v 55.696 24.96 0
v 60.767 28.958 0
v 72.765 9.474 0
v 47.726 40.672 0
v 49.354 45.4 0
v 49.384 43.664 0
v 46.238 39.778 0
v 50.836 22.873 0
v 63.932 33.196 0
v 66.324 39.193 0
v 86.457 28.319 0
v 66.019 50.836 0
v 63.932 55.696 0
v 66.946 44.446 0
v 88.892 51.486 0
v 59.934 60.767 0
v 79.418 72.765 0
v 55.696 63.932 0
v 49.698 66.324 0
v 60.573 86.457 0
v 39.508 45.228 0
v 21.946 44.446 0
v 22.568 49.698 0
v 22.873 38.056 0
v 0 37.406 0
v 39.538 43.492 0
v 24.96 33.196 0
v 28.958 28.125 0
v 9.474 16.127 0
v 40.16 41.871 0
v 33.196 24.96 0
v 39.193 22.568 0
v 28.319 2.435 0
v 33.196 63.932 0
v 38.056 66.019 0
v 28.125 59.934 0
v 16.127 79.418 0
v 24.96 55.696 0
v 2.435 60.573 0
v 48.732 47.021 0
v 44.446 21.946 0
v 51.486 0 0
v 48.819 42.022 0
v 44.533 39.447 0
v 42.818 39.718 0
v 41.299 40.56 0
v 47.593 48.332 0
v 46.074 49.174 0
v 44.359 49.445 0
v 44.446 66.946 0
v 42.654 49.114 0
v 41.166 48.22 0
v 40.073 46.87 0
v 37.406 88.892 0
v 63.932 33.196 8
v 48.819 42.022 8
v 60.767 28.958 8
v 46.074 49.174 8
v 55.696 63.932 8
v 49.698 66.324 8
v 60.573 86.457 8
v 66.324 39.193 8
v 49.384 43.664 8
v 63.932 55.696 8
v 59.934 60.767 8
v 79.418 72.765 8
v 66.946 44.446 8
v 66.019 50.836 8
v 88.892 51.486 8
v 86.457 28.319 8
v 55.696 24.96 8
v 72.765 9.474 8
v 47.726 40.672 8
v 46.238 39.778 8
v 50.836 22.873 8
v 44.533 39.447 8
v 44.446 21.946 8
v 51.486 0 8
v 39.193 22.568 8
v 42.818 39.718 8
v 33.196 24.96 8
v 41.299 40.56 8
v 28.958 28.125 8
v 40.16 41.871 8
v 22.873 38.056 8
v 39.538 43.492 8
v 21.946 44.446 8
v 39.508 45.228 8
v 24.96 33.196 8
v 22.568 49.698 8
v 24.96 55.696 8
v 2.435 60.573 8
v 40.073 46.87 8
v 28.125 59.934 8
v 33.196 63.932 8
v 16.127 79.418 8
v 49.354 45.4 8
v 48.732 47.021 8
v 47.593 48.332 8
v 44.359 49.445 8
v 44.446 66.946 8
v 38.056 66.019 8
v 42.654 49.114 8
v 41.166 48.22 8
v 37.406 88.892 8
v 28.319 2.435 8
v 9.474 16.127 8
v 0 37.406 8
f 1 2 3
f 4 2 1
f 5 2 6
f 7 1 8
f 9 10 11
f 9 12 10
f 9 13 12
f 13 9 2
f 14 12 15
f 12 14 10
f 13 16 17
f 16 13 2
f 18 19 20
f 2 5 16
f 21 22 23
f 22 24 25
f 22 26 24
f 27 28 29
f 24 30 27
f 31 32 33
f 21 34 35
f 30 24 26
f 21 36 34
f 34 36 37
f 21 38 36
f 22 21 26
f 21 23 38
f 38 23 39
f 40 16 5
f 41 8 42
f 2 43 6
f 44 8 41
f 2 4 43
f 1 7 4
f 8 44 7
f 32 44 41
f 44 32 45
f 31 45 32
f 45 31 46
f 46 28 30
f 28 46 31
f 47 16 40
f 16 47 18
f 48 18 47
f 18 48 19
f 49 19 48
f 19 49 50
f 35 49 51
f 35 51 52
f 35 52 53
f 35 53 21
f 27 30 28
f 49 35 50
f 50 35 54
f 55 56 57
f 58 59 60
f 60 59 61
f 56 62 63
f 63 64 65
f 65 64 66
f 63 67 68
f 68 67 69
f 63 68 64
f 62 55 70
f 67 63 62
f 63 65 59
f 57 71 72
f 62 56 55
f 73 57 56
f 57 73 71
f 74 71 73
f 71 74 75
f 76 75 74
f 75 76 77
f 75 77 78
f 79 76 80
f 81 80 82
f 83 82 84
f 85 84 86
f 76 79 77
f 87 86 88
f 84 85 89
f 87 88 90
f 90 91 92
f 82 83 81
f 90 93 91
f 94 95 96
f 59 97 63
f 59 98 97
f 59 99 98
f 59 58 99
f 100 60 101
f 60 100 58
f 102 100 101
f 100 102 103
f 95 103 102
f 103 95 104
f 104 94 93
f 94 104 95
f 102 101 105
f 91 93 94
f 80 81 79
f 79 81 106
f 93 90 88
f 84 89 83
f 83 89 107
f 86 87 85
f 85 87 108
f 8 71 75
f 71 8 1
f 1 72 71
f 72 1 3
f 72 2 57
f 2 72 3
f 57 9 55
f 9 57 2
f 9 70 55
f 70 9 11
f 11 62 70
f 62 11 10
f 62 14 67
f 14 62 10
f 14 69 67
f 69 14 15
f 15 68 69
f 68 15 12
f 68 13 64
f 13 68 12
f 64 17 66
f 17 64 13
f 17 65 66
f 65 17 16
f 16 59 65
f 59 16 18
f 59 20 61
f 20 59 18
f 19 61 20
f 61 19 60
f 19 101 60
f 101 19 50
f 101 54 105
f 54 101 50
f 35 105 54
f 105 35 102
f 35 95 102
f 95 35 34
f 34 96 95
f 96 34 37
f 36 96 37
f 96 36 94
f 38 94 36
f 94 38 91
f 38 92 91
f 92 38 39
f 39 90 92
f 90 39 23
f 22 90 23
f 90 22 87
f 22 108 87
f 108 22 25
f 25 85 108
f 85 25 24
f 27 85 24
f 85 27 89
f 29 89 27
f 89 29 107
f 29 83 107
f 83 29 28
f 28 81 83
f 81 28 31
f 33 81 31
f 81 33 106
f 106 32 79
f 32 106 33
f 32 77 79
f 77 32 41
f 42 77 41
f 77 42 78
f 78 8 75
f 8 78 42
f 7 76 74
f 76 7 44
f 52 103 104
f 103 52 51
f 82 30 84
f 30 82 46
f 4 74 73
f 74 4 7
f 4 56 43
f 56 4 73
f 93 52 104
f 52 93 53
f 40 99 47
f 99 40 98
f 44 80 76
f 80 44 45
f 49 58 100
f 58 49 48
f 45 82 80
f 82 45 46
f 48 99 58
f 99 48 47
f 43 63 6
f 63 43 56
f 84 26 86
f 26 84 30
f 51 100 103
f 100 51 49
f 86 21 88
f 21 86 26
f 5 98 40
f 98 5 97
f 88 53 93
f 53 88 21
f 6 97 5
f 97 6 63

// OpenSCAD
$fn = 32;

// ----------------------------------------------------------------------
// Star wheel: 12-point ratchet, R45
// ----------------------------------------------------------------------

// --- parameters (mm) ---
n_points = 12;            // number of points / teeth
r_out = 45;               // tip radius
r_in = 22.5;              // root radius
bore_r = 5;               // centre bore radius
plate_t = 8;              // plate thickness, Z (extrusion height)
bore_d = 10;              // centre bore diameter

profile = [[21.946, 44.446], [0, 37.406], [22.873, 38.056], [24.96, 33.196], [9.474, 16.127], [28.958, 28.125], [33.196, 24.96], [28.319, 2.435], [39.193, 22.568], [44.446, 21.946], [51.486, 0], [50.836, 22.873], [55.696, 24.96], [72.765, 9.474], [60.767, 28.958], [63.932, 33.196], [86.457, 28.319], [66.324, 39.193], [66.946, 44.446], [88.892, 51.486], [66.019, 50.836], [63.932, 55.696], [79.418, 72.765], [59.934, 60.767], [55.696, 63.932], [60.573, 86.457], [49.698, 66.324], [44.446, 66.946], [37.406, 88.892], [38.056, 66.019], [33.196, 63.932], [16.127, 79.418], [28.125, 59.934], [24.96, 55.696], [2.435, 60.573], [22.568, 49.698]];  // primary outline, 36 points, counter clockwise
void_1 = [[49.354, 45.4], [48.732, 47.021], [47.593, 48.332], [46.074, 49.174], [44.359, 49.445], [42.654, 49.114], [41.166, 48.22], [40.073, 46.87], [39.508, 45.228], [39.538, 43.492], [40.16, 41.871], [41.299, 40.56], [42.818, 39.718], [44.533, 39.447], [46.238, 39.778], [47.726, 40.672], [48.819, 42.022], [49.384, 43.664]];  // centre bore, 18 points

// --- the one profile operation ---
difference() {
  linear_extrude(height = plate_t) polygon(points = profile);
  translate([0, 0, -1])
    linear_extrude(height = plate_t + 2) polygon(points = void_1);
}
